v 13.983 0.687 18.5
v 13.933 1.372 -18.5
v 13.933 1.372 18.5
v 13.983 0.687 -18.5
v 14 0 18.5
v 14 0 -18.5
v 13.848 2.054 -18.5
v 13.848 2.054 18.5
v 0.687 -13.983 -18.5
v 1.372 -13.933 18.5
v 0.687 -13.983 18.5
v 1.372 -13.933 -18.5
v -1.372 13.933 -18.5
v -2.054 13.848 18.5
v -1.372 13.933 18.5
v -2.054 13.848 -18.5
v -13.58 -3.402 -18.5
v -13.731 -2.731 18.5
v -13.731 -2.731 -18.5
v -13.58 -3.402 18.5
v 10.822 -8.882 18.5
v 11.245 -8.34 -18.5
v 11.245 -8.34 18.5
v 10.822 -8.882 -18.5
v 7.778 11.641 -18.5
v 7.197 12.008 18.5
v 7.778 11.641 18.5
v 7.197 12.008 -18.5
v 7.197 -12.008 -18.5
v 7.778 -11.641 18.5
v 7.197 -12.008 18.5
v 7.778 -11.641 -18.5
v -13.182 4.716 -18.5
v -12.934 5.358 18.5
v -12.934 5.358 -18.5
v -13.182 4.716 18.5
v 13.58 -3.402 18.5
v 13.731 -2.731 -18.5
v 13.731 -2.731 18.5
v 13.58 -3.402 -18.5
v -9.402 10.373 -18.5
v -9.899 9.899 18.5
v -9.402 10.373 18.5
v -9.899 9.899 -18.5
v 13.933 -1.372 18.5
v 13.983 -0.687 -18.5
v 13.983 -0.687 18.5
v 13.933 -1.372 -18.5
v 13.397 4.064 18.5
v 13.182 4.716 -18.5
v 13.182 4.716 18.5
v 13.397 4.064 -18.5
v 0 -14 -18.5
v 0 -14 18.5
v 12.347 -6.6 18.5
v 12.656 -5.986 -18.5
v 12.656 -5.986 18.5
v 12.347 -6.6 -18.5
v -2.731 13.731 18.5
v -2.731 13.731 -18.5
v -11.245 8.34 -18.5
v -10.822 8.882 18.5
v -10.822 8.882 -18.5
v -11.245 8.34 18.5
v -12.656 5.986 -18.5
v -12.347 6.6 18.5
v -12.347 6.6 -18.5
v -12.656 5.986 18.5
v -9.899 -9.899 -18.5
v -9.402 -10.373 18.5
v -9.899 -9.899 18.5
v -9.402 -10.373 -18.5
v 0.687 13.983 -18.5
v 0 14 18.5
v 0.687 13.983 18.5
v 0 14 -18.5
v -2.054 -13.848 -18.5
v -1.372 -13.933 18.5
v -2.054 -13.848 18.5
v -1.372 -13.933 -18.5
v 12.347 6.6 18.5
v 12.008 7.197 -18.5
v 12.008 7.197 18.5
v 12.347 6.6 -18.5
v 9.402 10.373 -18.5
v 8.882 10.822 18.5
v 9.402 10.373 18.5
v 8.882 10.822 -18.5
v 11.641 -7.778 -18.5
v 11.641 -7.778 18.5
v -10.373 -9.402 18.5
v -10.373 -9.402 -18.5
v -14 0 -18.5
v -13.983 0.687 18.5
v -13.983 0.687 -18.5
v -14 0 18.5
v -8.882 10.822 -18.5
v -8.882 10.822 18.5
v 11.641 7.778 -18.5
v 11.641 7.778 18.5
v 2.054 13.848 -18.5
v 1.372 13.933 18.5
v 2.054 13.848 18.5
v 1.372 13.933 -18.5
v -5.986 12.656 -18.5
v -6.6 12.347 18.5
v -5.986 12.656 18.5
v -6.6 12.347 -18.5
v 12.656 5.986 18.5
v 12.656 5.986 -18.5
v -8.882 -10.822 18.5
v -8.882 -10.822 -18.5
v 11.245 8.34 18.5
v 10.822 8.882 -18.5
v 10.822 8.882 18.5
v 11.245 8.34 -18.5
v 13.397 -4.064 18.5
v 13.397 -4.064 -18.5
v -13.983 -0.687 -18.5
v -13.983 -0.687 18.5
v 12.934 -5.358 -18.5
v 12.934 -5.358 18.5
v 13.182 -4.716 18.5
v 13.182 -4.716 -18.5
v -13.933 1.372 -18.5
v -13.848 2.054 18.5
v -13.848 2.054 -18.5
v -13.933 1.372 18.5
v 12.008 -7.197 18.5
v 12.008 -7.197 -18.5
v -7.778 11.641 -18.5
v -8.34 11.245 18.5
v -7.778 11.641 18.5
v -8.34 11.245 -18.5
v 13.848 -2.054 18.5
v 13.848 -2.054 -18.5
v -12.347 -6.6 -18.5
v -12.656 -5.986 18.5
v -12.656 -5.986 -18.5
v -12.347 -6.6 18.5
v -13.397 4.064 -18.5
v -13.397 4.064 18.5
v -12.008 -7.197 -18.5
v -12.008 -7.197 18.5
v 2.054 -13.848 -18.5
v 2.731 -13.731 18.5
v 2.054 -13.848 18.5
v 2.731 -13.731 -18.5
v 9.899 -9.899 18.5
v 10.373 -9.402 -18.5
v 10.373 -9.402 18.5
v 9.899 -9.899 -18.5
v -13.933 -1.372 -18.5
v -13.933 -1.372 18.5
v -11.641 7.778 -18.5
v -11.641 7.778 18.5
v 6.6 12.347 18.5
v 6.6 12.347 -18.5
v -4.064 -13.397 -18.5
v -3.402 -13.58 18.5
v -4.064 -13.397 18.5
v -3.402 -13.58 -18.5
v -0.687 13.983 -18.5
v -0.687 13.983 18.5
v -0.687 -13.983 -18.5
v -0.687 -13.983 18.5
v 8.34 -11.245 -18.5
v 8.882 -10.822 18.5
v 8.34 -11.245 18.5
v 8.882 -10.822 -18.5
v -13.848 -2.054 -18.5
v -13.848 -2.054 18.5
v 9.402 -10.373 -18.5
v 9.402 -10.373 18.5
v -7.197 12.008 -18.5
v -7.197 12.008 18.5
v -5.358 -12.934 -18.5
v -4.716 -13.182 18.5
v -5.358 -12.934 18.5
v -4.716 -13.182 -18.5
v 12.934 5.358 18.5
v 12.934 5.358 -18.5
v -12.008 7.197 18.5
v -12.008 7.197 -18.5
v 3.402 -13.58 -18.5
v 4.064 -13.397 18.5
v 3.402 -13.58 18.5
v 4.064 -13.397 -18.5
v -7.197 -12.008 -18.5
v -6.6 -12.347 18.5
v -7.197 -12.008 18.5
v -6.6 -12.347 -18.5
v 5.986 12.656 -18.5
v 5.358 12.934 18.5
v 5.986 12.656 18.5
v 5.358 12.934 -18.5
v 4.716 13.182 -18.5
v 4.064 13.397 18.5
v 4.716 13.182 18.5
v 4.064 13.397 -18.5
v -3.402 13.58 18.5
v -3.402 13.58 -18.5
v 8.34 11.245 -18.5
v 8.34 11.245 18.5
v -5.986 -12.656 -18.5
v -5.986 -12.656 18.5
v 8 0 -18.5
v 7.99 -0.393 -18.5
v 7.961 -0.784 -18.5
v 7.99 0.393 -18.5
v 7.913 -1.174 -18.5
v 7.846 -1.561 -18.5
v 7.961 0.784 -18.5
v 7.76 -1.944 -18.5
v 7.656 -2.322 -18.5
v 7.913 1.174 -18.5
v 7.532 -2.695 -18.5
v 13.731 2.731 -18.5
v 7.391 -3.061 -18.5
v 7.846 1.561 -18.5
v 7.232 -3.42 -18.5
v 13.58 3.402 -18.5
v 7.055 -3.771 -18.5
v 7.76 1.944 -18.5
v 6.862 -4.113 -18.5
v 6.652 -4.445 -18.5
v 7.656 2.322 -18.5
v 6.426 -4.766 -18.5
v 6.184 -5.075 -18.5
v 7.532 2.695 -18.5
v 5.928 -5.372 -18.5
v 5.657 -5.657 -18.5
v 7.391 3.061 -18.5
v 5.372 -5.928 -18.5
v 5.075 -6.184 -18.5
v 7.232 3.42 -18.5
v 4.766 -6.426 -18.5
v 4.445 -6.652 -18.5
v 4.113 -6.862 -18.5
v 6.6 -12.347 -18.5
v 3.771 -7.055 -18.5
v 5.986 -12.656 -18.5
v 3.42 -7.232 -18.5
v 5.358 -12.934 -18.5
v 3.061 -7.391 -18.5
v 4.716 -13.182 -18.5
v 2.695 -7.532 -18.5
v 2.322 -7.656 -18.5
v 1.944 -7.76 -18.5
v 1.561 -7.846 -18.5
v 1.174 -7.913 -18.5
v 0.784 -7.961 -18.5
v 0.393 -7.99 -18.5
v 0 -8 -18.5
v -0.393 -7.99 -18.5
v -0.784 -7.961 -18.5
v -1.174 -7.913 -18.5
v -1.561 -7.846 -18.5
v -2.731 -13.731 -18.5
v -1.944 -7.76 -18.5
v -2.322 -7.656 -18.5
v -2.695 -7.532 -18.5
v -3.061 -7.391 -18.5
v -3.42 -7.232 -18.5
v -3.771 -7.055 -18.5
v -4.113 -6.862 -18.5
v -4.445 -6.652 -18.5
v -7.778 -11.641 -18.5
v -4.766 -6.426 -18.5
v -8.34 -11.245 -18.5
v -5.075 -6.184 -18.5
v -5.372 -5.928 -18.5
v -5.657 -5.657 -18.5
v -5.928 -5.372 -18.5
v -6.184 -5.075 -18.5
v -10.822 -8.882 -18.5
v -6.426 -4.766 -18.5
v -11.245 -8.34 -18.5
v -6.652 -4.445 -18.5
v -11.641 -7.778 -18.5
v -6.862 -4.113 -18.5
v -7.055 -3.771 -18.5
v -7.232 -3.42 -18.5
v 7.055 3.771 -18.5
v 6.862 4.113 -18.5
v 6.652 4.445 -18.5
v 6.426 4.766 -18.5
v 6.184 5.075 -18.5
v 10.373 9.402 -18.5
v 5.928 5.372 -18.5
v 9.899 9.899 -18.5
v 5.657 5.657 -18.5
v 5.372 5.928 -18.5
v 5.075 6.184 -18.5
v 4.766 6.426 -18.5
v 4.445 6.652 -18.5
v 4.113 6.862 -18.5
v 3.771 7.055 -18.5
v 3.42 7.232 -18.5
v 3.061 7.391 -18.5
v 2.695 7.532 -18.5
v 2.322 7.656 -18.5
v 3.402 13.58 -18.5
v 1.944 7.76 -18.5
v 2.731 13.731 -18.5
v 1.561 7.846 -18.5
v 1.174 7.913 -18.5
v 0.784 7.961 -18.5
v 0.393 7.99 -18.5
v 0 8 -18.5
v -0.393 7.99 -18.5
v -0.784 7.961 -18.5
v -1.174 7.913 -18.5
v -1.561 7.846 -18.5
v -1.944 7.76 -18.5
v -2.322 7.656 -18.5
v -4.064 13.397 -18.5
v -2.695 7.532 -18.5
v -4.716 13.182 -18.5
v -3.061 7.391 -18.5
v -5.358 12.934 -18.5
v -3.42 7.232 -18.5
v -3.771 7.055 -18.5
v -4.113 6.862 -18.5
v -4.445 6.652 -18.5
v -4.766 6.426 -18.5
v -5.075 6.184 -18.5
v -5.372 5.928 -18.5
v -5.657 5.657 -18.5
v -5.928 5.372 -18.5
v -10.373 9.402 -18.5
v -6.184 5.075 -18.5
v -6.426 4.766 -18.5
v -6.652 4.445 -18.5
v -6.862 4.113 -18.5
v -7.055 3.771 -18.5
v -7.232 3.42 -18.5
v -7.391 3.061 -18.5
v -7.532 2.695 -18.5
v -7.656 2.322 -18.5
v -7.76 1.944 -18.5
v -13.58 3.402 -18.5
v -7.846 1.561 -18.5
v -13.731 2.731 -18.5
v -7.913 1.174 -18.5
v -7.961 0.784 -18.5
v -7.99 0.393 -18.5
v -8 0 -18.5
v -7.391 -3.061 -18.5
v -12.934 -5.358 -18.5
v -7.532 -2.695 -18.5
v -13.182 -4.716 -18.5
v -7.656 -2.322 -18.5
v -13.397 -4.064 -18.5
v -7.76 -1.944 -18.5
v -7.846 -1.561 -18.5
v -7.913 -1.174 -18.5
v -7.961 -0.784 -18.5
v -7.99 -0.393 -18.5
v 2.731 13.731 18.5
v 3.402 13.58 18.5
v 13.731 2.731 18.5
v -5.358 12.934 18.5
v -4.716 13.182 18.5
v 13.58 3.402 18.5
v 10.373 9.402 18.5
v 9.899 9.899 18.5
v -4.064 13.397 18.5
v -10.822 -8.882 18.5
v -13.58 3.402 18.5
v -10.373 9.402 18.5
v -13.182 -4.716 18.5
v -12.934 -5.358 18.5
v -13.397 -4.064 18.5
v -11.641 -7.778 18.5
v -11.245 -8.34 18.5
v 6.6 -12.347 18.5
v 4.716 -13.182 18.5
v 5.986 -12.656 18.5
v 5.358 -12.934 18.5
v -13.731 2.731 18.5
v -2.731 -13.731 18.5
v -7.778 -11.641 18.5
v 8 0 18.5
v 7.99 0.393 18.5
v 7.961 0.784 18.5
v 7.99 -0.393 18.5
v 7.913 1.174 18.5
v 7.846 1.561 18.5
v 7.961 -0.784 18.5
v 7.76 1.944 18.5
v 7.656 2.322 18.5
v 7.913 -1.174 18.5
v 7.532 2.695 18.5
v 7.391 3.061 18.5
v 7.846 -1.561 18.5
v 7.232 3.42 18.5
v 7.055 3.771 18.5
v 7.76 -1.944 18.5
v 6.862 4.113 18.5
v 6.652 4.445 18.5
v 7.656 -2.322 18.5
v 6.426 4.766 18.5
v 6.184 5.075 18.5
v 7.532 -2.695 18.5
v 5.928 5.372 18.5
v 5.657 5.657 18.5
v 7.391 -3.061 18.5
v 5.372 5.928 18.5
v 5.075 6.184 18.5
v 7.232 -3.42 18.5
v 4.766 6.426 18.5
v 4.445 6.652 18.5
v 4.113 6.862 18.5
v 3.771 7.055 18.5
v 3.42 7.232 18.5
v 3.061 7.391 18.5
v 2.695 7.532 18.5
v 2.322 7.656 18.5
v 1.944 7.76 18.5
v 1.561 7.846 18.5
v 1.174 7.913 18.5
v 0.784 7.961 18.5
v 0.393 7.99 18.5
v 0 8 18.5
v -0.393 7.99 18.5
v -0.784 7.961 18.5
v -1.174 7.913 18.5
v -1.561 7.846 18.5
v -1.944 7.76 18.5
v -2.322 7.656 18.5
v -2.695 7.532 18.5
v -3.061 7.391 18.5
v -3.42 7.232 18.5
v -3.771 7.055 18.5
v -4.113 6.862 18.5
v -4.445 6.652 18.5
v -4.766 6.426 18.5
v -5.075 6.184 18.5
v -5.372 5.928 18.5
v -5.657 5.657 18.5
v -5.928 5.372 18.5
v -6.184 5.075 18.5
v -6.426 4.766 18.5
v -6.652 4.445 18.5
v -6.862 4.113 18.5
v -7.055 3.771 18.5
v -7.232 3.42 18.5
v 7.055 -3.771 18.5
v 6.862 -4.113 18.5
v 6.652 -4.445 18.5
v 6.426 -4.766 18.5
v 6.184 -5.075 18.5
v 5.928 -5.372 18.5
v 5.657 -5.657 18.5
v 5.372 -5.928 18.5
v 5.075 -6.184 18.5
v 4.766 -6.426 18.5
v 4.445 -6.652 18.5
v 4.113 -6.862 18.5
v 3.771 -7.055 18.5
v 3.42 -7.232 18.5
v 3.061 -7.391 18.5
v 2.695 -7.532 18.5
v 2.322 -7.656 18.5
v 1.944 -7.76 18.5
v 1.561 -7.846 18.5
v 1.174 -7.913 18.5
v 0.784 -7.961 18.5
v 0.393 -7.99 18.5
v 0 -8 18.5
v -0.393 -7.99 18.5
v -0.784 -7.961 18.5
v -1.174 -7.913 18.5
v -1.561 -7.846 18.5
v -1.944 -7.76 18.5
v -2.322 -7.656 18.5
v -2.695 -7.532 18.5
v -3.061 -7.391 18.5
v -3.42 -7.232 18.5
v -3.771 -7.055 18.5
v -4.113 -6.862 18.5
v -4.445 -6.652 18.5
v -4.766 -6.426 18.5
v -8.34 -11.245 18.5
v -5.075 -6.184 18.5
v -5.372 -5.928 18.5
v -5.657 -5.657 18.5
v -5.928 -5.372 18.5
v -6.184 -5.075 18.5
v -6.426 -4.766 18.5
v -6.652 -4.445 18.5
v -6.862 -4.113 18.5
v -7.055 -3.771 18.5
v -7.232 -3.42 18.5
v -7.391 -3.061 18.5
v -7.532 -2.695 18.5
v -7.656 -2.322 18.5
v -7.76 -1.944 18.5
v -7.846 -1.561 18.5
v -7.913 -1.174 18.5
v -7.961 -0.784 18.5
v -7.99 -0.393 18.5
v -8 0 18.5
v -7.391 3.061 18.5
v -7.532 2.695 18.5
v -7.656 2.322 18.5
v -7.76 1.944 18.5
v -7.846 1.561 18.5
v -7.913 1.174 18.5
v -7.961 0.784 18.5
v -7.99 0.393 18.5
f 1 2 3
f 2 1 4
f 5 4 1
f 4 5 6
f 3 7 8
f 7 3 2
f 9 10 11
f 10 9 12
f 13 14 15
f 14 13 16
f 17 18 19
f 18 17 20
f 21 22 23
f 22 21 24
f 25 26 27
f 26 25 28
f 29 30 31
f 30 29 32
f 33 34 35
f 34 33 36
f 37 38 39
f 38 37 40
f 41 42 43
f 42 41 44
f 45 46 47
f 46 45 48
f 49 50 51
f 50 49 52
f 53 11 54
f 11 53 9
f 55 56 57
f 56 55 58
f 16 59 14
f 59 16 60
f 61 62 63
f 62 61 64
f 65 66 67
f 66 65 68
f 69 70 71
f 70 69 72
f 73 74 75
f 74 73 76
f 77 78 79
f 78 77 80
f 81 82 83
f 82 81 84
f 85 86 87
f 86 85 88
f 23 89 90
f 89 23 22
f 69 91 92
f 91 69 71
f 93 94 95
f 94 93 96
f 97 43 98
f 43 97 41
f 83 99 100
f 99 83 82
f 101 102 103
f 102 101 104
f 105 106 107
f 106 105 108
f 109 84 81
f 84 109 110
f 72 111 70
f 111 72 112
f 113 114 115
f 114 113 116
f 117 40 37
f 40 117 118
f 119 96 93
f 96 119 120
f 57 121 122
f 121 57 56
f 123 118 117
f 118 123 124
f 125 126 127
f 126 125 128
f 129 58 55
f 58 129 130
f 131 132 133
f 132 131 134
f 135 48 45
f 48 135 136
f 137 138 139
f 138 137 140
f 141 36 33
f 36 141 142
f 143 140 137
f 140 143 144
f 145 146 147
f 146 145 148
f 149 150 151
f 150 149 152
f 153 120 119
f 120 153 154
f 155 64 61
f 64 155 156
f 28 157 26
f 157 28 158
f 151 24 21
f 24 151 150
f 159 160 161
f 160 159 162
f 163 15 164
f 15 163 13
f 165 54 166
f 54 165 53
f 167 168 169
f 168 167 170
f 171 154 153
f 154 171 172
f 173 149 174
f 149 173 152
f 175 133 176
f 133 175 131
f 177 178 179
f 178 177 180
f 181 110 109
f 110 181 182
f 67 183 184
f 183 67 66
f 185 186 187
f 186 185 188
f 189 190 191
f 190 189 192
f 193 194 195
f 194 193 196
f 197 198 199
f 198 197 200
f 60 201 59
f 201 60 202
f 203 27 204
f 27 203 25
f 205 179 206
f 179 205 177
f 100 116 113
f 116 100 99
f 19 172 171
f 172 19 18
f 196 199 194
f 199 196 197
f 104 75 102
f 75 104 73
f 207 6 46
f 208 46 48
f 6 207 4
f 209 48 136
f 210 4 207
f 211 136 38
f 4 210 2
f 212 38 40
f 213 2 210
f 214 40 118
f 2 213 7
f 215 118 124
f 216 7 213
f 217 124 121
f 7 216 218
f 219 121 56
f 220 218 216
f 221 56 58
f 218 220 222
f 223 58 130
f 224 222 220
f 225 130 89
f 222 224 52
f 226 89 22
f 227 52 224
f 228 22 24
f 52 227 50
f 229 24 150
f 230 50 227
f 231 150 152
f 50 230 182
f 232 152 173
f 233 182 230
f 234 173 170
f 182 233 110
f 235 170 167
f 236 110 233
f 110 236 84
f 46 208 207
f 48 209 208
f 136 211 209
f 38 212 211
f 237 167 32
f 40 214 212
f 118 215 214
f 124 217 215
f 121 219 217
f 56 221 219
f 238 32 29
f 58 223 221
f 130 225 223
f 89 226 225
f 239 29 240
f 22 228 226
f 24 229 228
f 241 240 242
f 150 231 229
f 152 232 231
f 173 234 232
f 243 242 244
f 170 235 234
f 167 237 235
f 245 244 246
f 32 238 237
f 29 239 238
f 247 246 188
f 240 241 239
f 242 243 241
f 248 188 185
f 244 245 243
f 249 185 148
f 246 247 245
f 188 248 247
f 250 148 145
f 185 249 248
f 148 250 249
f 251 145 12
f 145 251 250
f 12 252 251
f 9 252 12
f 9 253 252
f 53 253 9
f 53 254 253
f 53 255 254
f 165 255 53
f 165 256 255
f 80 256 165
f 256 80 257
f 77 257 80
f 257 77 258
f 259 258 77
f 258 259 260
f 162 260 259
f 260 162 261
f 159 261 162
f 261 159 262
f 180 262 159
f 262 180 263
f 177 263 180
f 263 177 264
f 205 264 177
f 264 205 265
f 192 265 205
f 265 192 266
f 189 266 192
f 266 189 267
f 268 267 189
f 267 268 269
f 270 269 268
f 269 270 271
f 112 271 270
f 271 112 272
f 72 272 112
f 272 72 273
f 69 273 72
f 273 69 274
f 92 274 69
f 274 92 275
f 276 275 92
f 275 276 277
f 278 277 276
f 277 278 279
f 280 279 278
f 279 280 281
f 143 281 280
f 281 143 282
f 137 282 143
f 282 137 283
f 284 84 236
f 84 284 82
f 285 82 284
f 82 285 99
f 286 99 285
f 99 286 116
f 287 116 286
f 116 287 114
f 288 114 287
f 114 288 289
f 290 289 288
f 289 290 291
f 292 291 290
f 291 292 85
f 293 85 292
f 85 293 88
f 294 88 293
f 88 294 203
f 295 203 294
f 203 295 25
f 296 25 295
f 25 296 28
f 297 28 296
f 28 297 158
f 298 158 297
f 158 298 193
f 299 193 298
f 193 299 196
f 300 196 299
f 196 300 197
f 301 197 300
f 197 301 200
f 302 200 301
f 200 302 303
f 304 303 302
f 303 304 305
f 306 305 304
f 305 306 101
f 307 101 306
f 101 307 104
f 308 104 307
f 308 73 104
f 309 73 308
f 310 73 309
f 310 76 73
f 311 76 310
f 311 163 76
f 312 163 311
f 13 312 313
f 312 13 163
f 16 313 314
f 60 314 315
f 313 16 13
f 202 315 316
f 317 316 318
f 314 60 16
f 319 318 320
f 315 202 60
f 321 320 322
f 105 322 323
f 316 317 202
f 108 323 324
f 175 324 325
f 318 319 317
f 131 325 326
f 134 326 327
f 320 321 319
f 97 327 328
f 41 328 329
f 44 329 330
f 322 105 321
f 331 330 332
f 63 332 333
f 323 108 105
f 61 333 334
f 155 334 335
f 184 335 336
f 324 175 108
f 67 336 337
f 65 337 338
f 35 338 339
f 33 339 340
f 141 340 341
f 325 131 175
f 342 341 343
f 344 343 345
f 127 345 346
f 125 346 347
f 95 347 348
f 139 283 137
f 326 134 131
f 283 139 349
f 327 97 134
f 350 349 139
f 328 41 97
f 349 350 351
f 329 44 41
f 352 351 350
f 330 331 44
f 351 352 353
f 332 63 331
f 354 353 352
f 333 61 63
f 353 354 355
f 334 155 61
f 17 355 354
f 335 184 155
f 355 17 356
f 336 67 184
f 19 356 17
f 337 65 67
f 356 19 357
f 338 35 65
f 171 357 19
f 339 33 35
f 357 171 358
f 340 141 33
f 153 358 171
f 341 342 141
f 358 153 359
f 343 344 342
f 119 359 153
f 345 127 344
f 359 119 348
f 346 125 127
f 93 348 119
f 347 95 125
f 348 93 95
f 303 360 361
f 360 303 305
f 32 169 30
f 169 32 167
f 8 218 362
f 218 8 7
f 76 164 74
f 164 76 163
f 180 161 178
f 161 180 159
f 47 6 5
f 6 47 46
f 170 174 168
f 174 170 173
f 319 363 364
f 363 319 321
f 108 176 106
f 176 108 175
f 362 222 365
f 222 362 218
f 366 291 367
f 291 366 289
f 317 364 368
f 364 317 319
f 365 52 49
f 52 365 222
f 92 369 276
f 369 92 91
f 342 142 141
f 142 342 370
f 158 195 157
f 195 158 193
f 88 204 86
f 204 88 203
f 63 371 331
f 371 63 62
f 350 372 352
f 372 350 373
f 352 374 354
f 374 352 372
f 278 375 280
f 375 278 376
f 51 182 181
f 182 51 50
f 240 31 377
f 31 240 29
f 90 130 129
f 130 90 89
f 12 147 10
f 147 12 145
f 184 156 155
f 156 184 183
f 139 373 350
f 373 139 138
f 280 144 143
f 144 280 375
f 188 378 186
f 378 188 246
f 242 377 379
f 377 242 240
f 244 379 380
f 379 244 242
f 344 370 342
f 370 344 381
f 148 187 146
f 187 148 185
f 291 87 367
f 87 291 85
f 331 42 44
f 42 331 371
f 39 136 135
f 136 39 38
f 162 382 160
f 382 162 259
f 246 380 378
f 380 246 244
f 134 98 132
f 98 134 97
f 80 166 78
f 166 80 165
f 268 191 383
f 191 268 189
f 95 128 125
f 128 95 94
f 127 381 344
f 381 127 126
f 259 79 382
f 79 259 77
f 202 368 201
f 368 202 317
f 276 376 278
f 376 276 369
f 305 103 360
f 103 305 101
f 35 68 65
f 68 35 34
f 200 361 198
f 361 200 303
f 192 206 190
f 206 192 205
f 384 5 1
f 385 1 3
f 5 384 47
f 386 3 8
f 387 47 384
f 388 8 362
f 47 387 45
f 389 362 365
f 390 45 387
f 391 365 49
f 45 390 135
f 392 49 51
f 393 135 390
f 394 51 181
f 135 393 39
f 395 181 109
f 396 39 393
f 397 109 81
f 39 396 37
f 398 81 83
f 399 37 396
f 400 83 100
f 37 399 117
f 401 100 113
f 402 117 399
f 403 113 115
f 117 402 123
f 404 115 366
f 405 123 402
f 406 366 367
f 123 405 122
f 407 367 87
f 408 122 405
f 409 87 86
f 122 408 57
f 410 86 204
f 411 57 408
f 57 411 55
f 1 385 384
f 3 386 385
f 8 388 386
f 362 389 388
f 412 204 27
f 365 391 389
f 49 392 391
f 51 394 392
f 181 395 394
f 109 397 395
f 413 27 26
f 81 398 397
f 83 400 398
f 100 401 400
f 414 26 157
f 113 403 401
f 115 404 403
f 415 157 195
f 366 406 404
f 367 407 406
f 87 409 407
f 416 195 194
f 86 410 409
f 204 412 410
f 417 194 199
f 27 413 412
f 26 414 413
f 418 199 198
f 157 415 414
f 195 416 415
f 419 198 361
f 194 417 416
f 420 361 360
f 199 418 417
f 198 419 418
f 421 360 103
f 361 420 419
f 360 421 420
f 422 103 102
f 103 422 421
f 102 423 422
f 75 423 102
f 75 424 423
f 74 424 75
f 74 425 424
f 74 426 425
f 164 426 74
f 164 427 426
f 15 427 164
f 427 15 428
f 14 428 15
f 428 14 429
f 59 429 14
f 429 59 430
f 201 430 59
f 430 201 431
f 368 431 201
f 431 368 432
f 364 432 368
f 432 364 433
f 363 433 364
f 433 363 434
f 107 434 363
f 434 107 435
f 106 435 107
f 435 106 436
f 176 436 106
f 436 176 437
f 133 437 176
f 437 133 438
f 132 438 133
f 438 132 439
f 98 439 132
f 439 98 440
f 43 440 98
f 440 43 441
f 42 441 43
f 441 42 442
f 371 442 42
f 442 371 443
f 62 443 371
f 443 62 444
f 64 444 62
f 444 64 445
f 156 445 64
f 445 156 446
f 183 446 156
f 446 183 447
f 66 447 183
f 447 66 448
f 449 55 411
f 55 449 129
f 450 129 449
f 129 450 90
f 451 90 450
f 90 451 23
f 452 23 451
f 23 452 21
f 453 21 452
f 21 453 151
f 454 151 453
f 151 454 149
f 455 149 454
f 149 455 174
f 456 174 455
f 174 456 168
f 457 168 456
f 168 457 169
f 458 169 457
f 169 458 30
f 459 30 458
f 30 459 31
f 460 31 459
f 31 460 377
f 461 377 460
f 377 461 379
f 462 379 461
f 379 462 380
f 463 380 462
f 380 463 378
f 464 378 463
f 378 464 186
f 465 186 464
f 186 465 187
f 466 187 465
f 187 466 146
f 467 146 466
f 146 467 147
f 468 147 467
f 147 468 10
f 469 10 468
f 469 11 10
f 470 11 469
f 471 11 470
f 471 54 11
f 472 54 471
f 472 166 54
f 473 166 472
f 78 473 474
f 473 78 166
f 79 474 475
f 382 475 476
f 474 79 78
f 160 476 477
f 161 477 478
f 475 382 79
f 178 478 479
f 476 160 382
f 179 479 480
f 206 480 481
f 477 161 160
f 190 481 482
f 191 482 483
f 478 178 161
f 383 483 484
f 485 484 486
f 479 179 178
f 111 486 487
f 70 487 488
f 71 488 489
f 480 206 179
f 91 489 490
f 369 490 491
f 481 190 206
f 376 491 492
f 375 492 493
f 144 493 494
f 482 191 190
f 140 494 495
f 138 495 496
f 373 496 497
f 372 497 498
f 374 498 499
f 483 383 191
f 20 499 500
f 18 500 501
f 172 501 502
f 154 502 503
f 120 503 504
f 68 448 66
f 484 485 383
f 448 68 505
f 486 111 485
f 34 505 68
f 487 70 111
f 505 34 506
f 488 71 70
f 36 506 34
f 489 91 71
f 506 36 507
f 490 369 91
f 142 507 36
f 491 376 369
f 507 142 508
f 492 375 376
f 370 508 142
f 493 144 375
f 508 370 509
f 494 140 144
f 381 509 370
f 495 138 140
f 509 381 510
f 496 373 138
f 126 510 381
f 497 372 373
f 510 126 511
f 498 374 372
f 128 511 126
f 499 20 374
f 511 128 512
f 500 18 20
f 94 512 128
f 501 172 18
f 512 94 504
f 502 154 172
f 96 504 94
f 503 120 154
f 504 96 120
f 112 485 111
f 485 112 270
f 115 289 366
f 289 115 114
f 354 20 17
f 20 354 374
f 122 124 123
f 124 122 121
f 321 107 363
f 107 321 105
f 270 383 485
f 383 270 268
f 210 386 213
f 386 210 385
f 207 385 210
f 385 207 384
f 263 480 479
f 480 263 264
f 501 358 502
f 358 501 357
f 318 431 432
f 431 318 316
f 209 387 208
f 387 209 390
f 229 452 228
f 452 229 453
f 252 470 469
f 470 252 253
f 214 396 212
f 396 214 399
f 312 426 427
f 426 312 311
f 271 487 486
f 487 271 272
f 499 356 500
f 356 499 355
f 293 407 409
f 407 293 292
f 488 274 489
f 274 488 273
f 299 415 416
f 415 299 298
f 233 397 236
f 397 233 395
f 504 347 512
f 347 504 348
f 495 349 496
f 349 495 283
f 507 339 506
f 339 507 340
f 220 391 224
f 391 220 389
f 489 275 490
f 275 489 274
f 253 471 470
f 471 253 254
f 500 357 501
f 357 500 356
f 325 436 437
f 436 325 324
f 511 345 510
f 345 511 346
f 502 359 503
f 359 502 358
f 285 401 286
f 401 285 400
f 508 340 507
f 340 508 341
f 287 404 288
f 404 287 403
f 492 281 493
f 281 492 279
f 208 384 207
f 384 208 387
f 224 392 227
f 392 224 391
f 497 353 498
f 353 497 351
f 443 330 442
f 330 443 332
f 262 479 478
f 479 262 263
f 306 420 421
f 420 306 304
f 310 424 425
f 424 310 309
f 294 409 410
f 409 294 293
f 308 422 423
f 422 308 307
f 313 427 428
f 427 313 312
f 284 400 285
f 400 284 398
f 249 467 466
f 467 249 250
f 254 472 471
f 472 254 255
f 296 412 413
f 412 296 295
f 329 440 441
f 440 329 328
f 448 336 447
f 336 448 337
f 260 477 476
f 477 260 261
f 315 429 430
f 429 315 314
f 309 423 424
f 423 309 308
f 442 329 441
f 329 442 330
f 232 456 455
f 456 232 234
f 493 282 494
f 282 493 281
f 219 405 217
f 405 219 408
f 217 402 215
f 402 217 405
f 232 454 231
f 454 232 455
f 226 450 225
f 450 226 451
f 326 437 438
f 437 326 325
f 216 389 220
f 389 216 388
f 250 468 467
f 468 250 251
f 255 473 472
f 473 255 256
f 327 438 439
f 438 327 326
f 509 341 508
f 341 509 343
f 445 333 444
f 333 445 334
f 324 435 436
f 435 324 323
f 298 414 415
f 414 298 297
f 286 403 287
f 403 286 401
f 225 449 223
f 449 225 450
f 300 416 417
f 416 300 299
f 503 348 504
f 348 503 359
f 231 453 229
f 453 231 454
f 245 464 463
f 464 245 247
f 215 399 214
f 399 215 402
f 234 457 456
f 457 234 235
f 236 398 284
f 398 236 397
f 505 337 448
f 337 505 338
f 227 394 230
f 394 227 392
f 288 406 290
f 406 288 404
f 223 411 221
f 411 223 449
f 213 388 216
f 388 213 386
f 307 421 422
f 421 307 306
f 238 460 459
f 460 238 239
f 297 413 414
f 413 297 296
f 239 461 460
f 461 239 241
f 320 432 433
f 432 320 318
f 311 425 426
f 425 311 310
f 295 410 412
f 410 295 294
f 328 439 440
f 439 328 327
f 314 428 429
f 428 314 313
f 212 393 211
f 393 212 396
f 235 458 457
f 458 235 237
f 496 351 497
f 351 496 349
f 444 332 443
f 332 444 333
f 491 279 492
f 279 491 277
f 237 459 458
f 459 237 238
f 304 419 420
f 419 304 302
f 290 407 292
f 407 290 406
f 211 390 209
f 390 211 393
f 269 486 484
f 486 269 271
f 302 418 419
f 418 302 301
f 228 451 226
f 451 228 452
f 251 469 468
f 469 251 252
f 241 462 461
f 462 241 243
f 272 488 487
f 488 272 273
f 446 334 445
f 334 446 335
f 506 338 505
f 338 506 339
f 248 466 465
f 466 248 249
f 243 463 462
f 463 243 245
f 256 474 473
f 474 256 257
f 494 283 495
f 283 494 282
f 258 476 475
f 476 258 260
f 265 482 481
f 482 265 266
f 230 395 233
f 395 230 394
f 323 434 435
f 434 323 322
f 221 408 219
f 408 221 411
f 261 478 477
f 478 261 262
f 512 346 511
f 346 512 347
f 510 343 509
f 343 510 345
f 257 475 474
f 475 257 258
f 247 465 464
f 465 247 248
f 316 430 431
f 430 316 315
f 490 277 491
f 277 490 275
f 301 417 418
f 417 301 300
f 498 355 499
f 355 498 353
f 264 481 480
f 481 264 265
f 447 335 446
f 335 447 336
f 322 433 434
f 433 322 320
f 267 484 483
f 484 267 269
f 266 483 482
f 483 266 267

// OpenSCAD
// Linear bearing (LM16UU-like) — 16mm bore, 28mm OD, 37mm length
// Output is a single connected solid (a hollow cylinder). No external protrusions.

bore_diameter_mm  = 16.0;
outer_diameter_mm = 28.0;
length_mm         = 37.0;

eps_mm = 0.05;   // small tolerance for clean boolean ops
$fn = 128;

module linear_bearing_16_28_37() {
    bore_r  = bore_diameter_mm/2;
    outer_r = outer_diameter_mm/2;

    difference() {
        // Outer cylinder
        cylinder(r=outer_r, h=length_mm, center=true);

        // Through bore
        cylinder(r=bore_r, h=length_mm + 2*eps_mm, center=true);
    }
}

linear_bearing_16_28_37();
